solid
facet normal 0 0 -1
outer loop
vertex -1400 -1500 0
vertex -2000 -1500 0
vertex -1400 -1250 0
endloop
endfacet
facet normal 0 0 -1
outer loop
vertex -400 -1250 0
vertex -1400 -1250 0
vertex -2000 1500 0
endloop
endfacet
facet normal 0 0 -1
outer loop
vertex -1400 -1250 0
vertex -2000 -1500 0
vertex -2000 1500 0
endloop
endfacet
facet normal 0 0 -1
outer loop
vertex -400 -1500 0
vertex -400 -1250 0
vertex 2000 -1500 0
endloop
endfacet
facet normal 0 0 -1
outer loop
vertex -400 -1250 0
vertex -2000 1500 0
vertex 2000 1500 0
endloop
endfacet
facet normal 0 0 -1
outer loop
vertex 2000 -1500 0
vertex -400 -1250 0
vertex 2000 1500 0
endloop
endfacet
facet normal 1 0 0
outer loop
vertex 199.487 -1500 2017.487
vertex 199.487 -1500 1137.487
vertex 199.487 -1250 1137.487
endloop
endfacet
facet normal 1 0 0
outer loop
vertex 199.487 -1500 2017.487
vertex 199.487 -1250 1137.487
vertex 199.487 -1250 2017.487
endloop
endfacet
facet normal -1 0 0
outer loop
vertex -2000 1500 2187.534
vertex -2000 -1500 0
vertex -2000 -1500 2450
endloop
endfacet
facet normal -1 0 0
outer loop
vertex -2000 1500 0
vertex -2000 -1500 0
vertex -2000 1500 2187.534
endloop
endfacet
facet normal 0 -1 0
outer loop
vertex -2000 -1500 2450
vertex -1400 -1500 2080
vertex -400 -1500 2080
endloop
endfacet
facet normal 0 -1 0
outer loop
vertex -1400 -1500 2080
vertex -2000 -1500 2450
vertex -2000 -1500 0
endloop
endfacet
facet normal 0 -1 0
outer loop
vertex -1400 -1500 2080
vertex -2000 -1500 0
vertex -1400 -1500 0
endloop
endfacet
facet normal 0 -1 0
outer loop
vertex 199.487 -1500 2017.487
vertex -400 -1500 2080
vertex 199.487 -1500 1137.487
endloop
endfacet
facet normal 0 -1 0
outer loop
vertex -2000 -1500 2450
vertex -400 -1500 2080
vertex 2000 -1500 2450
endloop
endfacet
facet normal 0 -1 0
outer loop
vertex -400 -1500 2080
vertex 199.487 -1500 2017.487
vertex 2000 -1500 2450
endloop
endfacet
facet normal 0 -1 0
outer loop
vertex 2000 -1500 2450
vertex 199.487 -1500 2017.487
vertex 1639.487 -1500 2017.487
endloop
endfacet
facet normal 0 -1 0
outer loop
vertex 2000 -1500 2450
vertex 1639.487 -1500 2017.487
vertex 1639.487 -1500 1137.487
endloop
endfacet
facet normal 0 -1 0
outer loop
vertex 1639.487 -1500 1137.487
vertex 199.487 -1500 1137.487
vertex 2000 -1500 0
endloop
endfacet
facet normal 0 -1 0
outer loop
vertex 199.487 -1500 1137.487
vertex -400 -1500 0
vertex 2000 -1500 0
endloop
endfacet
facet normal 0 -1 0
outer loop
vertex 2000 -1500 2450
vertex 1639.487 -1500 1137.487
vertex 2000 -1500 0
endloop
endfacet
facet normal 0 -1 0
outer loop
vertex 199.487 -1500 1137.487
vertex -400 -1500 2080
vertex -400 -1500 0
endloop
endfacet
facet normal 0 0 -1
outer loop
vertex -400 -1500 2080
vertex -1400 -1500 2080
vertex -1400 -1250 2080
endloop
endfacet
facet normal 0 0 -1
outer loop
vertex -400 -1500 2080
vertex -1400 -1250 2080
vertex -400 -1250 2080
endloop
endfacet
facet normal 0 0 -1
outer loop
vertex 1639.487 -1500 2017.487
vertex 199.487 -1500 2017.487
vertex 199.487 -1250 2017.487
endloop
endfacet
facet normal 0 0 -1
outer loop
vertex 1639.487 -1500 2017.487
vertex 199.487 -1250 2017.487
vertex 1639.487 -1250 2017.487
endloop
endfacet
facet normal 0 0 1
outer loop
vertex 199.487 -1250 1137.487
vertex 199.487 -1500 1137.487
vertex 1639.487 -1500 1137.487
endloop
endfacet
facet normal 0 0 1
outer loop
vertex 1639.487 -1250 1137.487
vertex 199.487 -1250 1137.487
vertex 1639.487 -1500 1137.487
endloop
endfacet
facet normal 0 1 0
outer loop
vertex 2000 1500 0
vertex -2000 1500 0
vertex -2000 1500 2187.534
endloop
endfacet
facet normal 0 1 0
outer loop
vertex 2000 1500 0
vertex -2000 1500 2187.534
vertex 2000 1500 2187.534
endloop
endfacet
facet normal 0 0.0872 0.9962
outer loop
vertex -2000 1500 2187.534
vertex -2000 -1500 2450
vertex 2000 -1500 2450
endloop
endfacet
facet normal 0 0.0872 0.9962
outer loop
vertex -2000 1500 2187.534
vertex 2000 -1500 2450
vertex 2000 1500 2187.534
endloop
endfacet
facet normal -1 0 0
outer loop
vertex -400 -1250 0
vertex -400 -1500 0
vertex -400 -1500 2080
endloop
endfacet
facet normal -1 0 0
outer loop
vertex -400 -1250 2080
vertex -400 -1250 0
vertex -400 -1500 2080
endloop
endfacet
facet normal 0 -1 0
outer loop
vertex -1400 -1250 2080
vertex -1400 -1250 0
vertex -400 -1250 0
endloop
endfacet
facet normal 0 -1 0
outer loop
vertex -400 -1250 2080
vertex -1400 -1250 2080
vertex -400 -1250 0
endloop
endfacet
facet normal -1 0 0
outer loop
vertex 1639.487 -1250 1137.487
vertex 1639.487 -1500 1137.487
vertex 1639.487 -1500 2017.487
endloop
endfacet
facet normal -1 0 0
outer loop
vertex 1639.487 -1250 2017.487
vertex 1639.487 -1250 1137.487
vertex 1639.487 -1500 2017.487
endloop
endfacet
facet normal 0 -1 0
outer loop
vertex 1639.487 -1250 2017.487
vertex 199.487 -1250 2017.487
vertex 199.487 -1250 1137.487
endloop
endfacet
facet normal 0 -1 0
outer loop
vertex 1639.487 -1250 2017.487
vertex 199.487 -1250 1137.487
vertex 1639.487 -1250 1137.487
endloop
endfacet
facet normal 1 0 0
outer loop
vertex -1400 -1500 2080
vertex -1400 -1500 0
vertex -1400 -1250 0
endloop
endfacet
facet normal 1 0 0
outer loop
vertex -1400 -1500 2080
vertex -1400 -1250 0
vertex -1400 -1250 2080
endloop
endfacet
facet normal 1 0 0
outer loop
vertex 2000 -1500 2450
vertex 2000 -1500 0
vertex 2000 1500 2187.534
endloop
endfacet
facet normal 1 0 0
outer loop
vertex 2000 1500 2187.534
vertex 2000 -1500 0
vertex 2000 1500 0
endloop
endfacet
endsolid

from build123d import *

# Parameters (mm, degrees)
F0_W     = 4000
F0_H     = 3000
F1_DEPTH = 2450
F3_DEPTH = 4000
F4_W     = 1440
F4_H     = 880
F4_W_2   = 1000
F4_H_2   = 2080
F5_DEPTH = 250


with BuildPart() as f1:
    # F0 (on Top) → F1 (new body)
    with BuildSketch(Plane.XY):
        Rectangle(F0_W, F0_H)
    extrude(amount=F1_DEPTH)

    # F2 (on face) → F3 (cut)
    with BuildSketch(Plane.YZ.offset(2000)):
        Polygon((1500, 2450), (-1500, 2450), (1500, 2187.534009), align=None)
    extrude(amount=-F3_DEPTH, mode=Mode.SUBTRACT)

    # F4 (on face) → F5 (cut)
    with BuildSketch(Plane.XZ.offset(1500)):
        with Locations((919.487209, 1577.487411)):
            Rectangle(F4_W, F4_H)
        with Locations((-900, 1040)):
            Rectangle(F4_W_2, F4_H_2)
    extrude(amount=-F5_DEPTH, mode=Mode.SUBTRACT)


solid = f1.part
